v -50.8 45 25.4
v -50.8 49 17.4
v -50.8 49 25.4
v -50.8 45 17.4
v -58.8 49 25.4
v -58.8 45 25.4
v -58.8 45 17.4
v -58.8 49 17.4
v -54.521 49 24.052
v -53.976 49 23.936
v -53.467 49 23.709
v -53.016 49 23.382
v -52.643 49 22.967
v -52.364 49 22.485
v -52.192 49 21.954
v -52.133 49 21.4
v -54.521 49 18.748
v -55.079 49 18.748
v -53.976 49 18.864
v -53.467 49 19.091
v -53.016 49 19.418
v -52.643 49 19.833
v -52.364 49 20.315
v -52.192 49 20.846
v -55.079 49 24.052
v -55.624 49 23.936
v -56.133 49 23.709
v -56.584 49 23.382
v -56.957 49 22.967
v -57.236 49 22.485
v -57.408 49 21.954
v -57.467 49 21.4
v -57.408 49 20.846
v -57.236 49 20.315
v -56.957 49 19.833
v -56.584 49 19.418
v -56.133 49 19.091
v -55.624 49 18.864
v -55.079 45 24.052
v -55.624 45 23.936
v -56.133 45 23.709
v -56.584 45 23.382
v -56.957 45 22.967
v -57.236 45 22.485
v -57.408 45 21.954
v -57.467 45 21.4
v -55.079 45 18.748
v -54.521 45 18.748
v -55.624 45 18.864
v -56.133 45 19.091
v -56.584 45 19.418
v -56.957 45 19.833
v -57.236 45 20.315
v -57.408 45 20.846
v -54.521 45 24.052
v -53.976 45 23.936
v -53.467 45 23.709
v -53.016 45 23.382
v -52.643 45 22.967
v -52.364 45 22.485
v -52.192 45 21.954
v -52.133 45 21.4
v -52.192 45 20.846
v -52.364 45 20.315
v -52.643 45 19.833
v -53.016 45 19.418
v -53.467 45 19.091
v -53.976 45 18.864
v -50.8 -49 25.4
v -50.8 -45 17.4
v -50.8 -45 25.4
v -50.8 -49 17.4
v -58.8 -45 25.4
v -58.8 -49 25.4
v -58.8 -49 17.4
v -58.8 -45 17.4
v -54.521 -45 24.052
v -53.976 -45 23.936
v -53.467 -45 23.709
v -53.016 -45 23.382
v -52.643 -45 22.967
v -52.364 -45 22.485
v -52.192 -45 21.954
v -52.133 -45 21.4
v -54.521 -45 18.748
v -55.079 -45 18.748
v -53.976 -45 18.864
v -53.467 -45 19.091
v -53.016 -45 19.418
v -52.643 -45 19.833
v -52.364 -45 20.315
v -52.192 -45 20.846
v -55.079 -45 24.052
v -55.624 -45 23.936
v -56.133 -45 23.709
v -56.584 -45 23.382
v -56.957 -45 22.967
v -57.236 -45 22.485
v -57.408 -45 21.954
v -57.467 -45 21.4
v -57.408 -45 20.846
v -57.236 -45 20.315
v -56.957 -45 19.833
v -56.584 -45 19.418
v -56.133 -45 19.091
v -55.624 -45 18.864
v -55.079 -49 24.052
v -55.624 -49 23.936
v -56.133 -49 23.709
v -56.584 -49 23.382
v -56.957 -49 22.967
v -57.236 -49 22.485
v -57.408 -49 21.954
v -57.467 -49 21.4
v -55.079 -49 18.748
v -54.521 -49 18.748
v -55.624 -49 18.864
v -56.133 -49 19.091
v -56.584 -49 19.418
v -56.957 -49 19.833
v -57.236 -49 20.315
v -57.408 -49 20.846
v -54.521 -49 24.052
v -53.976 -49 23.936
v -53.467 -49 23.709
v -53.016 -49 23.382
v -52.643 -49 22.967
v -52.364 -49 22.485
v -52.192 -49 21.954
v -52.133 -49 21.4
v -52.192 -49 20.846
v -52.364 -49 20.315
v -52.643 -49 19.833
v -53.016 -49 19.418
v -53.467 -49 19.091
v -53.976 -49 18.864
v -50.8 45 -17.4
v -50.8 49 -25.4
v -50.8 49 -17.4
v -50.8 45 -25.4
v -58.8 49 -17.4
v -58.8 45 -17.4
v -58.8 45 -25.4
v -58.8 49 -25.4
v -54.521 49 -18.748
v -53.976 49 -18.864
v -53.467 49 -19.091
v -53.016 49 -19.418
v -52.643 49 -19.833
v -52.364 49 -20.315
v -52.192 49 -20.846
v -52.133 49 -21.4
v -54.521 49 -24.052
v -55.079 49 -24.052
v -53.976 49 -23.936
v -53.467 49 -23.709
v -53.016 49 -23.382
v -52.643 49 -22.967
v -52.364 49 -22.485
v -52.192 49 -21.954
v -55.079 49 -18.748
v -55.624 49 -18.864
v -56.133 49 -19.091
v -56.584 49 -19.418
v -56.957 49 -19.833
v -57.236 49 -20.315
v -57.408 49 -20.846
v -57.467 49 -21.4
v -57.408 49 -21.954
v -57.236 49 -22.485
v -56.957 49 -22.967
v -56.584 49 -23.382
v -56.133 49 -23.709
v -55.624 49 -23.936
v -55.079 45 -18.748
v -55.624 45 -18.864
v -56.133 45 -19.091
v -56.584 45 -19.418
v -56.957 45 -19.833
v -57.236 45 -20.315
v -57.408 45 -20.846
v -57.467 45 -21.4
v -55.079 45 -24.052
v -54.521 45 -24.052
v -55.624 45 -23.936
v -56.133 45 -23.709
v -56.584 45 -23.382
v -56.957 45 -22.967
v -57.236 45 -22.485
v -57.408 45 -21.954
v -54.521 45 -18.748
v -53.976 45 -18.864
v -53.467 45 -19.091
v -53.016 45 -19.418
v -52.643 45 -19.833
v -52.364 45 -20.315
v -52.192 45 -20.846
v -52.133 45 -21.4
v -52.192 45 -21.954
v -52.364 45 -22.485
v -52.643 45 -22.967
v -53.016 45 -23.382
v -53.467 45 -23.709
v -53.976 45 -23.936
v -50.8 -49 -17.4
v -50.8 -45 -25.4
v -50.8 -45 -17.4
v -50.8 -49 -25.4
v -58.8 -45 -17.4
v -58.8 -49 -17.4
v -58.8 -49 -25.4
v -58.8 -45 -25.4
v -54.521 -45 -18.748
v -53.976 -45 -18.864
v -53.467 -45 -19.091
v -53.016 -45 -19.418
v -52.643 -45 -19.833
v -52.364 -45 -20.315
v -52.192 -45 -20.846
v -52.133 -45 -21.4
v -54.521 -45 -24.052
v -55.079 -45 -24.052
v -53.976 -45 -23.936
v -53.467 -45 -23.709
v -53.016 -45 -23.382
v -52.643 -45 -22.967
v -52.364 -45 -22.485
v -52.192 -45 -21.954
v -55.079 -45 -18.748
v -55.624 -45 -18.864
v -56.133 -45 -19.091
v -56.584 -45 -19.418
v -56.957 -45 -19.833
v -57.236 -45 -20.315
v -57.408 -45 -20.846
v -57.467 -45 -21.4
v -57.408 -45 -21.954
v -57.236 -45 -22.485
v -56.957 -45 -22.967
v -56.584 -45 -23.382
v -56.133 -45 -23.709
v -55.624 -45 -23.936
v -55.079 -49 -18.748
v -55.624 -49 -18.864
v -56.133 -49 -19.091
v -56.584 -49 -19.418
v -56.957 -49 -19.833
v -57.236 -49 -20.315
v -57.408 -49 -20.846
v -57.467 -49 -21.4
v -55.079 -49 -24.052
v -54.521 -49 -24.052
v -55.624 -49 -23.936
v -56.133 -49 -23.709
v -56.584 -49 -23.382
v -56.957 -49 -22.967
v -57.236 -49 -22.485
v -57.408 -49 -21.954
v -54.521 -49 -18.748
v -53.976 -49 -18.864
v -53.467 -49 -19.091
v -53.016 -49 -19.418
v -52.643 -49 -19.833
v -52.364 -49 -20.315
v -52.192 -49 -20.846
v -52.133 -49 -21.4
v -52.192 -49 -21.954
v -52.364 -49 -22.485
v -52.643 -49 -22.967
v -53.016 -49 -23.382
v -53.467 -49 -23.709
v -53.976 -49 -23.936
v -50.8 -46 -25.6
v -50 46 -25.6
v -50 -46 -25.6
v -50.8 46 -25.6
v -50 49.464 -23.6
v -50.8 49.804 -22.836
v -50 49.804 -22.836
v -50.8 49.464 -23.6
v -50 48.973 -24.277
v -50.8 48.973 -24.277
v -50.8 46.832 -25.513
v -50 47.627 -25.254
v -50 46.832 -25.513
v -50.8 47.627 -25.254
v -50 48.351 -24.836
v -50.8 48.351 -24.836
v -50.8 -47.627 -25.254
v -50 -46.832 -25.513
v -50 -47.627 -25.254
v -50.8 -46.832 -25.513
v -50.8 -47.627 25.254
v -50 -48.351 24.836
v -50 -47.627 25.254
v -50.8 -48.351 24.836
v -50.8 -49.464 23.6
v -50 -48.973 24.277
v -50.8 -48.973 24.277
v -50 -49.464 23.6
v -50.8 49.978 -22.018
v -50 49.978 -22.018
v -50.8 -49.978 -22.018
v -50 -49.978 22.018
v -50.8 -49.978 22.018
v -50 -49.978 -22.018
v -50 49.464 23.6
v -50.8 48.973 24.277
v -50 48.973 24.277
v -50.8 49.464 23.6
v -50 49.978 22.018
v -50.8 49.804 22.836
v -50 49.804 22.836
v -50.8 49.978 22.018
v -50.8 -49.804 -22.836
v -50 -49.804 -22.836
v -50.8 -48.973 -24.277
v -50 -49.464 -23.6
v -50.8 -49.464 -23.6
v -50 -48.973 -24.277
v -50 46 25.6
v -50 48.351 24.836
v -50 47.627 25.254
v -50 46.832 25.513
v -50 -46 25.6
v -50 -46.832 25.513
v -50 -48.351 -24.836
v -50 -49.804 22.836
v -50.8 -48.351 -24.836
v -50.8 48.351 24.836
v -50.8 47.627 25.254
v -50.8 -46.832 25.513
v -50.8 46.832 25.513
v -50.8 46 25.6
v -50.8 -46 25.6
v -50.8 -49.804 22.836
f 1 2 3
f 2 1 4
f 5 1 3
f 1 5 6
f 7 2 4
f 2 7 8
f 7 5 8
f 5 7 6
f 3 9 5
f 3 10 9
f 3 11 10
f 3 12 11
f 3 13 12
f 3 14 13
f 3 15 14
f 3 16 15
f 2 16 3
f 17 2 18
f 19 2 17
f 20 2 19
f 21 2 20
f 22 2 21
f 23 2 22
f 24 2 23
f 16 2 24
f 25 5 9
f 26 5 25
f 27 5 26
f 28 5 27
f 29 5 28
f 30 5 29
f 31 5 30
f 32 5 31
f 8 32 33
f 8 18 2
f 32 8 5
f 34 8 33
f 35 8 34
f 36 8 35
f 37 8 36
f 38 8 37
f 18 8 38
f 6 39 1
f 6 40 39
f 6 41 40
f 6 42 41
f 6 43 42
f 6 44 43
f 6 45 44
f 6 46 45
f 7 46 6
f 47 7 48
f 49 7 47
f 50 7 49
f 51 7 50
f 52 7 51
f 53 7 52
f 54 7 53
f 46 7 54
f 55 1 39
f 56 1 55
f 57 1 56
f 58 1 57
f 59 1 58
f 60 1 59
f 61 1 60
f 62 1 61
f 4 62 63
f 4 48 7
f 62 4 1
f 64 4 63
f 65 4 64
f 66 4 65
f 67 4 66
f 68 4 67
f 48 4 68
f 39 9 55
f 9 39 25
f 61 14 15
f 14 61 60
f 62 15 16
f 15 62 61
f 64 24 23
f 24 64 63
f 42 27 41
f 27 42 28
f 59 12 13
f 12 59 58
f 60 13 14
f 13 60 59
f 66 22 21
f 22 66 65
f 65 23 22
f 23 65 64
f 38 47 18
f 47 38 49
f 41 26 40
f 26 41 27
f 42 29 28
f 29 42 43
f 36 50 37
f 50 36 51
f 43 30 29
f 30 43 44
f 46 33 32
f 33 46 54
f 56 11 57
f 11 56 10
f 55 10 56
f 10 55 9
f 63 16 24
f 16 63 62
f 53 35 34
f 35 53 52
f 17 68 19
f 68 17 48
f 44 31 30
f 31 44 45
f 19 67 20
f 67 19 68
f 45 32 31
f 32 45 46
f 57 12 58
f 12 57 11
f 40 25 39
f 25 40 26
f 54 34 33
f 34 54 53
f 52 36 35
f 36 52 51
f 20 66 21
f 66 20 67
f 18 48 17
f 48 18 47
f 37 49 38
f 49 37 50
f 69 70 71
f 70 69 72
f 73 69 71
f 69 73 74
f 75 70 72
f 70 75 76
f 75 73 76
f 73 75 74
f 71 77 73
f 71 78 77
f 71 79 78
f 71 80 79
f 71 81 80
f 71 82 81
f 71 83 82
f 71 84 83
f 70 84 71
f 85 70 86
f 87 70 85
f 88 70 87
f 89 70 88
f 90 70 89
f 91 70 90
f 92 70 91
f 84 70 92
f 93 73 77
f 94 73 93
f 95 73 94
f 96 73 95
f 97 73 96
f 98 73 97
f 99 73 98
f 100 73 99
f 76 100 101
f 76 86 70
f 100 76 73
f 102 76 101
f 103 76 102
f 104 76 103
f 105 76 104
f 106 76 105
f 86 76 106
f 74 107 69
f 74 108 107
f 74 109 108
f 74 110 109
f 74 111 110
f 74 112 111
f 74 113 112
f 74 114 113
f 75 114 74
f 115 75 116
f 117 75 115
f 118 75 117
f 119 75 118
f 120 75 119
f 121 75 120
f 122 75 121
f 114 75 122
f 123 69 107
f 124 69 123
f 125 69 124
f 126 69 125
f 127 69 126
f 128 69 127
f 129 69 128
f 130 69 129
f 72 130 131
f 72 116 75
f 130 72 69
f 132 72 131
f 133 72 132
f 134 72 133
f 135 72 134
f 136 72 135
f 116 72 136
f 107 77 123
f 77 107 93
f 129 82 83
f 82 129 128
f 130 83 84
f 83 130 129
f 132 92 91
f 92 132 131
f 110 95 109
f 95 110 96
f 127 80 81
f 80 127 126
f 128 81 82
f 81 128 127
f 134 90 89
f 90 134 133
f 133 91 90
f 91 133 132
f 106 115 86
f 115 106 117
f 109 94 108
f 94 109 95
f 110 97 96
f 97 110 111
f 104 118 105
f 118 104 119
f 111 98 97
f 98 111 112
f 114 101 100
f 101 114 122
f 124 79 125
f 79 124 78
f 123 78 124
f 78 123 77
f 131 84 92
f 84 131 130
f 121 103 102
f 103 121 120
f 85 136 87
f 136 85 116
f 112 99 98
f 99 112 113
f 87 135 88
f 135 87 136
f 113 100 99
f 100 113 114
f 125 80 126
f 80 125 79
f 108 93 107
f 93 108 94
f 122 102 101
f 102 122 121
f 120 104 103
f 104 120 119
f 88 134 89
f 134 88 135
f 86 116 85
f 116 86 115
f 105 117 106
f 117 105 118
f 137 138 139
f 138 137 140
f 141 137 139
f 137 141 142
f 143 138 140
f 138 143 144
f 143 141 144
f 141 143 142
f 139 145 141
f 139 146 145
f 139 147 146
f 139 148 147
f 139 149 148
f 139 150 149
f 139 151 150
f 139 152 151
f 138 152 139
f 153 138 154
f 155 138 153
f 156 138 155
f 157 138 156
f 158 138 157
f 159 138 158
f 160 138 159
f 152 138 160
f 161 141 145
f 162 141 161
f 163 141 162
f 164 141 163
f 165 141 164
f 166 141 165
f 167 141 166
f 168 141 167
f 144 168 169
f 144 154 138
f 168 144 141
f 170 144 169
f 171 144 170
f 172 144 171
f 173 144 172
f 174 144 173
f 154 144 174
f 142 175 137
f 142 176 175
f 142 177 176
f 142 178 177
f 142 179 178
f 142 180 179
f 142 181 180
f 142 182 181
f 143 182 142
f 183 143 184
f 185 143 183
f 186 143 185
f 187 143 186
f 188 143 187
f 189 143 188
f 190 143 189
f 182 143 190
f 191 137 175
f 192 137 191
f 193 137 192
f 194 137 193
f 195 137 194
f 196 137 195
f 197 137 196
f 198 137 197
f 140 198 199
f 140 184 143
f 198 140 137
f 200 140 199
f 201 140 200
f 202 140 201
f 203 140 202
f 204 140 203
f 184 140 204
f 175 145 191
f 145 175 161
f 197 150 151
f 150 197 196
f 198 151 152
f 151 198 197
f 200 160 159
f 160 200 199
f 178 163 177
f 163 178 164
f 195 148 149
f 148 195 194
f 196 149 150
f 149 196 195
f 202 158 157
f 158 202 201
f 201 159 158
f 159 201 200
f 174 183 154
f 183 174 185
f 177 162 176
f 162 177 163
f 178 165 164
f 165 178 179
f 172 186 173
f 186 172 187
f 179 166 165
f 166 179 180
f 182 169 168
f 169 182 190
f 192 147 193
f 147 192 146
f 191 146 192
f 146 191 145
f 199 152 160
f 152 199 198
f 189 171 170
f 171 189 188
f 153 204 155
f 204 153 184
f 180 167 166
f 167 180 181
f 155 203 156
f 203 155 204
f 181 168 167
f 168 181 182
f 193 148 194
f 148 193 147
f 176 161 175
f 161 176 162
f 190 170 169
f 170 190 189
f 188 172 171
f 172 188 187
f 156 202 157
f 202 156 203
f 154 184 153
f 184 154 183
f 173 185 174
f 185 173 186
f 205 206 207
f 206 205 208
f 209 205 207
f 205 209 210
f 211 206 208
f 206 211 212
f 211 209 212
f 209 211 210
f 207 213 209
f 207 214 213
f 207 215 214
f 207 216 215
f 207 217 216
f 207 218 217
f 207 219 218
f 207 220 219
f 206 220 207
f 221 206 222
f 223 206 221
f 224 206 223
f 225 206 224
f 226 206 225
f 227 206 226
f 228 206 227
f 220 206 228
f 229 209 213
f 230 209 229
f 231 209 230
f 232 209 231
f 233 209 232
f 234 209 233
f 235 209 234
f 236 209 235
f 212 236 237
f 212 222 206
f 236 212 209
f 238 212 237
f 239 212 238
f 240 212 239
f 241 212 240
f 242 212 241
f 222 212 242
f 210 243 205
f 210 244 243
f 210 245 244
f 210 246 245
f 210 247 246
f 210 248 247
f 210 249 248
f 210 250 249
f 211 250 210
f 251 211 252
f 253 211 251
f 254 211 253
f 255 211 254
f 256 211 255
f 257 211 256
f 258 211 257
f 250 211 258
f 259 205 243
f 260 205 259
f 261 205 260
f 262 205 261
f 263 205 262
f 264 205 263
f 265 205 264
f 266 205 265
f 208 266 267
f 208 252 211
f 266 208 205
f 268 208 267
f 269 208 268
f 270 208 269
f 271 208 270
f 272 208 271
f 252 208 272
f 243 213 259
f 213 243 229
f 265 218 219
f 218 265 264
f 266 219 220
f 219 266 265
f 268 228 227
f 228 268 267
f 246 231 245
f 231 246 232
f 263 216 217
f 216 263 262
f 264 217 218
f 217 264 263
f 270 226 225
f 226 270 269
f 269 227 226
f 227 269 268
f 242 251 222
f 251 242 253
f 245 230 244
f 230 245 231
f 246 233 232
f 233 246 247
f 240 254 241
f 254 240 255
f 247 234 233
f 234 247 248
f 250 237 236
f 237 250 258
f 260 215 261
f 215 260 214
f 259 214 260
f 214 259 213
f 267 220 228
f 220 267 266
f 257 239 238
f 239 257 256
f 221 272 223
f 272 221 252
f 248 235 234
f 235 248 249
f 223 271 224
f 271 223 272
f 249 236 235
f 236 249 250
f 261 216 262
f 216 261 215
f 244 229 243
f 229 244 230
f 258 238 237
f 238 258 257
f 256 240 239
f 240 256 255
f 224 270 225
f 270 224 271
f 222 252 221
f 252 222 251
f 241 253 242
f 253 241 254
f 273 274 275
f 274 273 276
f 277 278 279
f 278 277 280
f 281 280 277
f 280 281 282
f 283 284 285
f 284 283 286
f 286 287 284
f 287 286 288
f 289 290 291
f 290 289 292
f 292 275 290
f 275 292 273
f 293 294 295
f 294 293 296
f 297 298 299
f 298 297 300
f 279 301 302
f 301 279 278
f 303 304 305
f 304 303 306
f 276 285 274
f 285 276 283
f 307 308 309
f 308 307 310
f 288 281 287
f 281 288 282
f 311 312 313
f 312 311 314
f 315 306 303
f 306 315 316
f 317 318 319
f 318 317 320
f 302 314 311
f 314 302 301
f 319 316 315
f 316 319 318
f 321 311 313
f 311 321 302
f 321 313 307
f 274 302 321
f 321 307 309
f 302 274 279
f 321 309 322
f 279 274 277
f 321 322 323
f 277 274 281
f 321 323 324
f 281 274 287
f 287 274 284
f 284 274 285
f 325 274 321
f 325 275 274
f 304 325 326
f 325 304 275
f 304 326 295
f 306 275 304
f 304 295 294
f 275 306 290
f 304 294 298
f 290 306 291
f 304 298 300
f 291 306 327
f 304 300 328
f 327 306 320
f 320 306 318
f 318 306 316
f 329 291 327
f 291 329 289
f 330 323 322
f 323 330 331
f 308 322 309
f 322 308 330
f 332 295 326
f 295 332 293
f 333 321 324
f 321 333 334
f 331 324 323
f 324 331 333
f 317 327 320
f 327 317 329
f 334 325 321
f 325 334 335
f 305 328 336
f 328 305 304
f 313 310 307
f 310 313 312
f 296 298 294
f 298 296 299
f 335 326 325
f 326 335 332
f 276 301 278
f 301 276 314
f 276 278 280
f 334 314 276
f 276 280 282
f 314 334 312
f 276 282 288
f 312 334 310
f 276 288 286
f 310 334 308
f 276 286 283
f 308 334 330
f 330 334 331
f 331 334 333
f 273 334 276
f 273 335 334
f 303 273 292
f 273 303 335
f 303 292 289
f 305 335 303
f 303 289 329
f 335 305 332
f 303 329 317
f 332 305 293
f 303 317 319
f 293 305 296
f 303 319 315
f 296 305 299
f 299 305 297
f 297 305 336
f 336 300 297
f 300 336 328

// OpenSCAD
$fn=30;

// Element to be generated
Element="Right Wall";
// [Example, Drawer1, Drawer2, Drawer4, Shelf, Shelf with Bottom, Connect, Left Wall, Right Wall]

// Nuber of Elements, when Element=Set or Drawer1,2,4 the Number of generated elements is limited to 1
Number=1; // [1:1:8]

// Width of the drawer, Width of Box = drawer_x + 2*plug_w
drawer_x=100; // [50:1:160]

// Length of the drawer
drawer_y=100; // [50:1:160]

// Height of the drawer, Minimum 4xplug_w
drawer_z=50; // [16:1:160]

// Thickness of the drawer walls
drawer_t=0.8; // [0.4:0.1:2]

// Height of the shelf
shelf_z=10; // [8:0.5:20]

// Width of the plugs
plug_w=8; // [5:0.5:10]

// Plug wall thickness
plug_t=1.2; // [0.1:0.05:1]

// Width of ledge
shelf_ledge=5; // [4:0.5:10]

// Radius of the corners on the front panel of a drawer
cornerradius=3; // [0.5:0.5:6]

// Drawers adjustment for easy fitting
adjustment=0.5; // [0.1:0.05:1]

// Adjustment value for correction when using differences in OpenSCAD
diffcorr=0.2; // [0.1:0.05:1]

// Drawing the selected Element
for (i=[0:Number-1]) {
  if (Element=="Example")      {example();}
  else if (Element=="Drawer1") {drawer(1);}
  else if (Element=="Drawer2") {drawer(2);}
  else if (Element=="Drawer4") {drawer(4);}
  else if (Element=="Shelf")   {shelf();}
  else if (Element=="Shelf with Bottom")   {shelf(true);}
  else if (Element=="Connect") {connect();}
  else if (Element=="Left Wall")    {wall("left");}
  else if (Element=="Right Wall")    {wall("right");}
}

module example() {
  shelf();
  translate([0,0,drawer_z+drawer_t])rotate([0,0,0])shelf();

  height=drawer_z+drawer_t+2*plug_w;

  translate([+1*(drawer_x/2+drawer_t+plug_w/2),-1*(drawer_y/2-plug_w/2-drawer_t),height/2])rotate([-90,0,0])connect();
  translate([-1*(drawer_x/2+drawer_t+plug_w/2),-1*(drawer_y/2-plug_w/2-drawer_t),height/2])rotate([-90,0,0])connect();
  translate([+1*(drawer_x/2+drawer_t+plug_w/2),+1*(drawer_y/2-plug_w/2-drawer_t),height/2])rotate([90,0,0])connect();
  translate([-1*(drawer_x/2+drawer_t+plug_w/2),+1*(drawer_y/2-plug_w/2-drawer_t),height/2])rotate([90,0,0])connect();

  translate([-drawer_x-plug_w-2*drawer_t,0,height/2])rotate([0,180,0])wall("Left");
  translate([-drawer_t,-30,drawer_t*7/4])drawer(1);
}

module wall(side="right") {
  height=drawer_z+drawer_t-2*plug_w;
  hull() {
    translate([-1*(drawer_x/2+drawer_t/2),-drawer_y/2+plug_w/2,-plug_w/2-diffcorr-height/2])rotate([0,90,0])cylinder(d=plug_w,h=drawer_t,center=true);
    translate([-1*(drawer_x/2+drawer_t/2),-drawer_y/2+plug_w/2,+plug_w/2+diffcorr+height/2])rotate([0,90,0])cylinder(d=plug_w,h=drawer_t,center=true);
    translate([-1*(drawer_x/2+drawer_t/2),+drawer_y/2-plug_w/2,-plug_w/2-diffcorr-height/2])rotate([0,90,0])cylinder(d=plug_w,h=drawer_t,center=true);
    translate([-1*(drawer_x/2+drawer_t/2),+drawer_y/2-plug_w/2,+plug_w/2+diffcorr+height/2])rotate([0,90,0])cylinder(d=plug_w,h=drawer_t,center=true);
  }
  if (side=="right") {
    translate([-1*(drawer_x/2+plug_w/2+drawer_t),+1*(drawer_y/2-plug_w/4-drawer_t-diffcorr),+height/2+plug_w/2])joint(depth=plug_w/2);
    translate([-1*(drawer_x/2+plug_w/2+drawer_t),-1*(drawer_y/2-plug_w/4-drawer_t-diffcorr),+height/2+plug_w/2])joint(depth=plug_w/2);
    translate([-1*(drawer_x/2+plug_w/2+drawer_t),+1*(drawer_y/2-plug_w/4-drawer_t-diffcorr),-height/2-plug_w/2])joint(depth=plug_w/2);
    translate([-1*(drawer_x/2+plug_w/2+drawer_t),-1*(drawer_y/2-plug_w/4-drawer_t-diffcorr),-height/2-plug_w/2])joint(depth=plug_w/2);
  }
  else {
    translate([-1*(drawer_x/2+plug_w/2+drawer_t),+1*(drawer_y/2-plug_w*3/4-drawer_t-diffcorr),+height/2+plug_w/2])joint(depth=plug_w/2);
    translate([-1*(drawer_x/2+plug_w/2+drawer_t),-1*(drawer_y/2-plug_w*3/4-drawer_t-diffcorr),+height/2+plug_w/2])joint(depth=plug_w/2);
    translate([-1*(drawer_x/2+plug_w/2+drawer_t),+1*(drawer_y/2-plug_w*3/4-drawer_t-diffcorr),-height/2-plug_w/2])joint(depth=plug_w/2);
    translate([-1*(drawer_x/2+plug_w/2+drawer_t),-1*(drawer_y/2-plug_w*3/4-drawer_t-diffcorr),-height/2-plug_w/2])joint(depth=plug_w/2);
  }
}

module shelf(bottom=false) {
  union() {
    difference() {
      translate([0,0,drawer_t/2]) cube([drawer_x,drawer_y,drawer_t], center=true);
      if (bottom==false) {
        translate([0,0,drawer_t/2]) cube([drawer_x-2*shelf_ledge,drawer_y-2*shelf_ledge,drawer_t+1], center=true);
      }
    }
    translate([-drawer_x/2-drawer_t/2,0,shelf_z/2]) cube([drawer_t,drawer_y,shelf_z], center=true);
    translate([+drawer_x/2+drawer_t/2,0,shelf_z/2]) cube([drawer_t,drawer_y,shelf_z], center=true);

    translate([0,drawer_y/2-drawer_t/2,shelf_z/2]) cube([drawer_x+2*drawer_t,drawer_t,shelf_z], center=true);

    translate([+1*(drawer_x/2+plug_w/2+drawer_t),-1*(drawer_y/2-plug_w/4-plug_w/2-diffcorr-drawer_t-diffcorr),plug_w/2])joint(depth=plug_w/2);
    translate([+1*(drawer_x/2+plug_w/2+drawer_t),+1*(drawer_y/2-plug_w/4-plug_w/2-diffcorr-drawer_t-diffcorr),plug_w/2])joint(depth=plug_w/2);
    translate([-1*(drawer_x/2+plug_w/2+drawer_t),+1*(drawer_y/2-plug_w/4-drawer_t-diffcorr),plug_w/2])joint(depth=plug_w/2);
    translate([-1*(drawer_x/2+plug_w/2+drawer_t),-1*(drawer_y/2-plug_w/4-drawer_t-diffcorr),plug_w/2])joint(depth=plug_w/2);

    if (bottom==false) {
      translate([+1*(drawer_x/2+plug_w/2+drawer_t),-1*(drawer_y/2-plug_w/4-plug_w/2-diffcorr-drawer_t-diffcorr),plug_w*3/2])joint(depth=plug_w/2);
      translate([+1*(drawer_x/2+plug_w/2+drawer_t),+1*(drawer_y/2-plug_w/4-plug_w/2-diffcorr-drawer_t-diffcorr),plug_w*3/2])joint(depth=plug_w/2);
      translate([-1*(drawer_x/2+plug_w/2+drawer_t),+1*(drawer_y/2-plug_w/4-drawer_t-diffcorr),plug_w*3/2])joint(depth=plug_w/2);
      translate([-1*(drawer_x/2+plug_w/2+drawer_t),-1*(drawer_y/2-plug_w/4-drawer_t-diffcorr),plug_w*3/2])joint(depth=plug_w/2);

      translate([-1*(drawer_x/2+drawer_t/2),-1*(drawer_y/2-plug_w*3/4-diffcorr),shelf_z]) rotate([0,90,0])cylinder(d=plug_w*2/3,h=drawer_t, center=true);
      translate([+1*(drawer_x/2+drawer_t/2),-1*(drawer_y/2-plug_w*3/4-diffcorr),shelf_z]) rotate([0,90,0])cylinder(d=plug_w*2/3,h=drawer_t, center=true);
    }
    else{
      translate([0,-drawer_y/2+drawer_t/2,shelf_z/2]) cube([drawer_x+2*drawer_t,drawer_t,shelf_z], center=true);
    }
  }
}

module joint(depth=plug_w) {
  difference() {
    cube([plug_w,depth,plug_w],center=true);
    rotate([90,0,0])cylinder(d=plug_w*2/3,h=depth+diffcorr,center=true);
  }
}

module connect(height=plug_w) {
  height=drawer_z+drawer_t-2*plug_w;
  hull() {
    translate([0,-plug_w/2-diffcorr-height/2,-plug_w/2-drawer_t/2])cylinder(d=plug_w,h=drawer_t,center=true);
    translate([0,+plug_w/2+diffcorr+height/2,-plug_w/2-drawer_t/2])cylinder(d=plug_w,h=drawer_t,center=true);
  }

  translate([0,0,-plug_w/4])cube([plug_w/3,height-diffcorr-plug_w,plug_w/2],center=true);

  translate([0,-height/2+diffcorr/2+plug_w/6,diffcorr/2])cube([plug_w,plug_w/3,plug_w+diffcorr],center=true);
  translate([0,+1*(-height/2+diffcorr/2+plug_w/12),plug_w*2/3+diffcorr]) {
    difference() {
      translate([0,0,plug_w/4])prism(plug_w,plug_w/2,plug_w/2);
      translate([0,0,plug_w*4/8])cube([plug_w+diffcorr,plug_w/2+diffcorr,plug_w/2],center=true);

    }
    rotate([0,180,0])translate([0,0,plug_w/4])prism(plug_w,plug_w/2,plug_w/2);
  }

  translate([0,-1*(-height/2+diffcorr/2+plug_w/6),diffcorr/2])cube([plug_w,plug_w/3,plug_w+diffcorr],center=true);
  translate([0,-1*(-height/2+diffcorr/2+plug_w/12),plug_w*2/3+diffcorr])rotate([0,0,180]) {
    difference() {
      translate([0,0,plug_w/4])prism(plug_w,plug_w/2,plug_w/2);
      translate([0,0,plug_w*4/8])cube([plug_w+diffcorr,plug_w/2+diffcorr,plug_w/2],center=true);

    }
    rotate([0,180,0])translate([0,0,plug_w/4])prism(plug_w,plug_w/2,plug_w/2);
  }

  translate([0,-plug_w/2-diffcorr/2-height/2,0])cylinder(d=plug_w*2/3-2*diffcorr,h=plug_w,center=true);
  translate([0,-plug_w/2-diffcorr/2-height/2,plug_w/2])sphere(d=plug_w*2/3-2*diffcorr,center=true);
  translate([0,+plug_w/2+diffcorr/2+height/2,0])cylinder(d=plug_w*2/3-2*diffcorr,h=plug_w,center=true);
  translate([0,+plug_w/2+diffcorr/2+height/2,plug_w/2])sphere(d=plug_w*2/3-2*diffcorr,center=true);
}

module drawer(type=1) {
  union() {
    if (type==1 || type==2 || type==4) {
      //bottom
      cube([drawer_x-adjustment,drawer_y,drawer_t], center=true);
      // left wall
      translate([-drawer_x/2+drawer_t/2+adjustment/2,0,drawer_z/2-drawer_t/2-adjustment/2])
        cube([drawer_t,drawer_y,drawer_z-adjustment], center=true);
      // right wall
      translate([+drawer_x/2-drawer_t/2-adjustment/2,0,drawer_z/2-drawer_t/2-adjustment/2])
        cube([drawer_t,drawer_y,drawer_z-adjustment], center=true);
      // back wall
      translate([0,+drawer_y/2-drawer_t/2,drawer_z/2-drawer_t/2-adjustment/2])
        cube([drawer_x-adjustment,drawer_t,drawer_z-adjustment], center=true);
      // drawer stops
      translate([+drawer_x/2-drawer_t/4,+drawer_y/2-drawer_t/2,shelf_z])
        scale([1,1,1.4])rotate([90,0,0])cylinder(r=drawer_t,h=drawer_t,center=true);
      translate([-drawer_x/2+drawer_t/4,+drawer_y/2-drawer_t/2,shelf_z])
        scale([1,1,1.4])rotate([90,0,0])cylinder(r=drawer_t,h=drawer_t,center=true);
      // front wall
      translate([0,-drawer_y/2+drawer_t/2,cornerradius-drawer_t/2])
        hull() {
          translate([-drawer_x/2+drawer_t,0,0])rotate([90,0,0]) cylinder(r=cornerradius,h=drawer_t,center=true);
          translate([+drawer_x/2-drawer_t,0,0])rotate([90,0,0]) cylinder(r=cornerradius,h=drawer_t,center=true);
          translate([-drawer_x/2+drawer_t,0,drawer_z-cornerradius*2])rotate([90,0,0]) cylinder(r=cornerradius,h=drawer_t,center=true);
          translate([+drawer_x/2-drawer_t,0,drawer_z-cornerradius*2])rotate([90,0,0]) cylinder(r=cornerradius,h=drawer_t,center=true);
        }
      // handle
      if (drawer_z>20) {
        drawer_z=20;
        translate([0,-drawer_y/2+drawer_t/2-2.5,drawer_z/2-drawer_t])cube([4,5,drawer_z-drawer_t], center=true);
        translate([0,-drawer_y/2-drawer_t-6,drawer_z/2-drawer_t])cylinder(d=6,h=drawer_z-drawer_t, center=true);
        translate([0,-drawer_y/2-drawer_t-6,drawer_z/2-drawer_t+drawer_z/2-drawer_t/2])sphere(d=6, center=true);
      }
    }
    if (type==2 || type==4) {
      translate([0,0,drawer_z/2-drawer_t/2-adjustment/2])
        cube([drawer_t,drawer_y,drawer_z-adjustment], center=true);
    }
    if (type==4) {
      translate([0,0,drawer_z/2-drawer_t/2-adjustment/2])
        cube([drawer_x-adjustment,drawer_t,drawer_z-adjustment], center=true);
    }
  }
}

module prism(l, w, h, pos){
  rotate(pos) translate([-l/2,-w/2,-h/2])polyhedron(
    points=[[0,0,0], [l,0,0], [l,w,0], [0,w,0], [0,w,h], [l,w,h]],
    faces=[[0,1,2,3],[5,4,3,2],[0,4,5,1],[0,3,4],[5,2,1]]
  );
}
